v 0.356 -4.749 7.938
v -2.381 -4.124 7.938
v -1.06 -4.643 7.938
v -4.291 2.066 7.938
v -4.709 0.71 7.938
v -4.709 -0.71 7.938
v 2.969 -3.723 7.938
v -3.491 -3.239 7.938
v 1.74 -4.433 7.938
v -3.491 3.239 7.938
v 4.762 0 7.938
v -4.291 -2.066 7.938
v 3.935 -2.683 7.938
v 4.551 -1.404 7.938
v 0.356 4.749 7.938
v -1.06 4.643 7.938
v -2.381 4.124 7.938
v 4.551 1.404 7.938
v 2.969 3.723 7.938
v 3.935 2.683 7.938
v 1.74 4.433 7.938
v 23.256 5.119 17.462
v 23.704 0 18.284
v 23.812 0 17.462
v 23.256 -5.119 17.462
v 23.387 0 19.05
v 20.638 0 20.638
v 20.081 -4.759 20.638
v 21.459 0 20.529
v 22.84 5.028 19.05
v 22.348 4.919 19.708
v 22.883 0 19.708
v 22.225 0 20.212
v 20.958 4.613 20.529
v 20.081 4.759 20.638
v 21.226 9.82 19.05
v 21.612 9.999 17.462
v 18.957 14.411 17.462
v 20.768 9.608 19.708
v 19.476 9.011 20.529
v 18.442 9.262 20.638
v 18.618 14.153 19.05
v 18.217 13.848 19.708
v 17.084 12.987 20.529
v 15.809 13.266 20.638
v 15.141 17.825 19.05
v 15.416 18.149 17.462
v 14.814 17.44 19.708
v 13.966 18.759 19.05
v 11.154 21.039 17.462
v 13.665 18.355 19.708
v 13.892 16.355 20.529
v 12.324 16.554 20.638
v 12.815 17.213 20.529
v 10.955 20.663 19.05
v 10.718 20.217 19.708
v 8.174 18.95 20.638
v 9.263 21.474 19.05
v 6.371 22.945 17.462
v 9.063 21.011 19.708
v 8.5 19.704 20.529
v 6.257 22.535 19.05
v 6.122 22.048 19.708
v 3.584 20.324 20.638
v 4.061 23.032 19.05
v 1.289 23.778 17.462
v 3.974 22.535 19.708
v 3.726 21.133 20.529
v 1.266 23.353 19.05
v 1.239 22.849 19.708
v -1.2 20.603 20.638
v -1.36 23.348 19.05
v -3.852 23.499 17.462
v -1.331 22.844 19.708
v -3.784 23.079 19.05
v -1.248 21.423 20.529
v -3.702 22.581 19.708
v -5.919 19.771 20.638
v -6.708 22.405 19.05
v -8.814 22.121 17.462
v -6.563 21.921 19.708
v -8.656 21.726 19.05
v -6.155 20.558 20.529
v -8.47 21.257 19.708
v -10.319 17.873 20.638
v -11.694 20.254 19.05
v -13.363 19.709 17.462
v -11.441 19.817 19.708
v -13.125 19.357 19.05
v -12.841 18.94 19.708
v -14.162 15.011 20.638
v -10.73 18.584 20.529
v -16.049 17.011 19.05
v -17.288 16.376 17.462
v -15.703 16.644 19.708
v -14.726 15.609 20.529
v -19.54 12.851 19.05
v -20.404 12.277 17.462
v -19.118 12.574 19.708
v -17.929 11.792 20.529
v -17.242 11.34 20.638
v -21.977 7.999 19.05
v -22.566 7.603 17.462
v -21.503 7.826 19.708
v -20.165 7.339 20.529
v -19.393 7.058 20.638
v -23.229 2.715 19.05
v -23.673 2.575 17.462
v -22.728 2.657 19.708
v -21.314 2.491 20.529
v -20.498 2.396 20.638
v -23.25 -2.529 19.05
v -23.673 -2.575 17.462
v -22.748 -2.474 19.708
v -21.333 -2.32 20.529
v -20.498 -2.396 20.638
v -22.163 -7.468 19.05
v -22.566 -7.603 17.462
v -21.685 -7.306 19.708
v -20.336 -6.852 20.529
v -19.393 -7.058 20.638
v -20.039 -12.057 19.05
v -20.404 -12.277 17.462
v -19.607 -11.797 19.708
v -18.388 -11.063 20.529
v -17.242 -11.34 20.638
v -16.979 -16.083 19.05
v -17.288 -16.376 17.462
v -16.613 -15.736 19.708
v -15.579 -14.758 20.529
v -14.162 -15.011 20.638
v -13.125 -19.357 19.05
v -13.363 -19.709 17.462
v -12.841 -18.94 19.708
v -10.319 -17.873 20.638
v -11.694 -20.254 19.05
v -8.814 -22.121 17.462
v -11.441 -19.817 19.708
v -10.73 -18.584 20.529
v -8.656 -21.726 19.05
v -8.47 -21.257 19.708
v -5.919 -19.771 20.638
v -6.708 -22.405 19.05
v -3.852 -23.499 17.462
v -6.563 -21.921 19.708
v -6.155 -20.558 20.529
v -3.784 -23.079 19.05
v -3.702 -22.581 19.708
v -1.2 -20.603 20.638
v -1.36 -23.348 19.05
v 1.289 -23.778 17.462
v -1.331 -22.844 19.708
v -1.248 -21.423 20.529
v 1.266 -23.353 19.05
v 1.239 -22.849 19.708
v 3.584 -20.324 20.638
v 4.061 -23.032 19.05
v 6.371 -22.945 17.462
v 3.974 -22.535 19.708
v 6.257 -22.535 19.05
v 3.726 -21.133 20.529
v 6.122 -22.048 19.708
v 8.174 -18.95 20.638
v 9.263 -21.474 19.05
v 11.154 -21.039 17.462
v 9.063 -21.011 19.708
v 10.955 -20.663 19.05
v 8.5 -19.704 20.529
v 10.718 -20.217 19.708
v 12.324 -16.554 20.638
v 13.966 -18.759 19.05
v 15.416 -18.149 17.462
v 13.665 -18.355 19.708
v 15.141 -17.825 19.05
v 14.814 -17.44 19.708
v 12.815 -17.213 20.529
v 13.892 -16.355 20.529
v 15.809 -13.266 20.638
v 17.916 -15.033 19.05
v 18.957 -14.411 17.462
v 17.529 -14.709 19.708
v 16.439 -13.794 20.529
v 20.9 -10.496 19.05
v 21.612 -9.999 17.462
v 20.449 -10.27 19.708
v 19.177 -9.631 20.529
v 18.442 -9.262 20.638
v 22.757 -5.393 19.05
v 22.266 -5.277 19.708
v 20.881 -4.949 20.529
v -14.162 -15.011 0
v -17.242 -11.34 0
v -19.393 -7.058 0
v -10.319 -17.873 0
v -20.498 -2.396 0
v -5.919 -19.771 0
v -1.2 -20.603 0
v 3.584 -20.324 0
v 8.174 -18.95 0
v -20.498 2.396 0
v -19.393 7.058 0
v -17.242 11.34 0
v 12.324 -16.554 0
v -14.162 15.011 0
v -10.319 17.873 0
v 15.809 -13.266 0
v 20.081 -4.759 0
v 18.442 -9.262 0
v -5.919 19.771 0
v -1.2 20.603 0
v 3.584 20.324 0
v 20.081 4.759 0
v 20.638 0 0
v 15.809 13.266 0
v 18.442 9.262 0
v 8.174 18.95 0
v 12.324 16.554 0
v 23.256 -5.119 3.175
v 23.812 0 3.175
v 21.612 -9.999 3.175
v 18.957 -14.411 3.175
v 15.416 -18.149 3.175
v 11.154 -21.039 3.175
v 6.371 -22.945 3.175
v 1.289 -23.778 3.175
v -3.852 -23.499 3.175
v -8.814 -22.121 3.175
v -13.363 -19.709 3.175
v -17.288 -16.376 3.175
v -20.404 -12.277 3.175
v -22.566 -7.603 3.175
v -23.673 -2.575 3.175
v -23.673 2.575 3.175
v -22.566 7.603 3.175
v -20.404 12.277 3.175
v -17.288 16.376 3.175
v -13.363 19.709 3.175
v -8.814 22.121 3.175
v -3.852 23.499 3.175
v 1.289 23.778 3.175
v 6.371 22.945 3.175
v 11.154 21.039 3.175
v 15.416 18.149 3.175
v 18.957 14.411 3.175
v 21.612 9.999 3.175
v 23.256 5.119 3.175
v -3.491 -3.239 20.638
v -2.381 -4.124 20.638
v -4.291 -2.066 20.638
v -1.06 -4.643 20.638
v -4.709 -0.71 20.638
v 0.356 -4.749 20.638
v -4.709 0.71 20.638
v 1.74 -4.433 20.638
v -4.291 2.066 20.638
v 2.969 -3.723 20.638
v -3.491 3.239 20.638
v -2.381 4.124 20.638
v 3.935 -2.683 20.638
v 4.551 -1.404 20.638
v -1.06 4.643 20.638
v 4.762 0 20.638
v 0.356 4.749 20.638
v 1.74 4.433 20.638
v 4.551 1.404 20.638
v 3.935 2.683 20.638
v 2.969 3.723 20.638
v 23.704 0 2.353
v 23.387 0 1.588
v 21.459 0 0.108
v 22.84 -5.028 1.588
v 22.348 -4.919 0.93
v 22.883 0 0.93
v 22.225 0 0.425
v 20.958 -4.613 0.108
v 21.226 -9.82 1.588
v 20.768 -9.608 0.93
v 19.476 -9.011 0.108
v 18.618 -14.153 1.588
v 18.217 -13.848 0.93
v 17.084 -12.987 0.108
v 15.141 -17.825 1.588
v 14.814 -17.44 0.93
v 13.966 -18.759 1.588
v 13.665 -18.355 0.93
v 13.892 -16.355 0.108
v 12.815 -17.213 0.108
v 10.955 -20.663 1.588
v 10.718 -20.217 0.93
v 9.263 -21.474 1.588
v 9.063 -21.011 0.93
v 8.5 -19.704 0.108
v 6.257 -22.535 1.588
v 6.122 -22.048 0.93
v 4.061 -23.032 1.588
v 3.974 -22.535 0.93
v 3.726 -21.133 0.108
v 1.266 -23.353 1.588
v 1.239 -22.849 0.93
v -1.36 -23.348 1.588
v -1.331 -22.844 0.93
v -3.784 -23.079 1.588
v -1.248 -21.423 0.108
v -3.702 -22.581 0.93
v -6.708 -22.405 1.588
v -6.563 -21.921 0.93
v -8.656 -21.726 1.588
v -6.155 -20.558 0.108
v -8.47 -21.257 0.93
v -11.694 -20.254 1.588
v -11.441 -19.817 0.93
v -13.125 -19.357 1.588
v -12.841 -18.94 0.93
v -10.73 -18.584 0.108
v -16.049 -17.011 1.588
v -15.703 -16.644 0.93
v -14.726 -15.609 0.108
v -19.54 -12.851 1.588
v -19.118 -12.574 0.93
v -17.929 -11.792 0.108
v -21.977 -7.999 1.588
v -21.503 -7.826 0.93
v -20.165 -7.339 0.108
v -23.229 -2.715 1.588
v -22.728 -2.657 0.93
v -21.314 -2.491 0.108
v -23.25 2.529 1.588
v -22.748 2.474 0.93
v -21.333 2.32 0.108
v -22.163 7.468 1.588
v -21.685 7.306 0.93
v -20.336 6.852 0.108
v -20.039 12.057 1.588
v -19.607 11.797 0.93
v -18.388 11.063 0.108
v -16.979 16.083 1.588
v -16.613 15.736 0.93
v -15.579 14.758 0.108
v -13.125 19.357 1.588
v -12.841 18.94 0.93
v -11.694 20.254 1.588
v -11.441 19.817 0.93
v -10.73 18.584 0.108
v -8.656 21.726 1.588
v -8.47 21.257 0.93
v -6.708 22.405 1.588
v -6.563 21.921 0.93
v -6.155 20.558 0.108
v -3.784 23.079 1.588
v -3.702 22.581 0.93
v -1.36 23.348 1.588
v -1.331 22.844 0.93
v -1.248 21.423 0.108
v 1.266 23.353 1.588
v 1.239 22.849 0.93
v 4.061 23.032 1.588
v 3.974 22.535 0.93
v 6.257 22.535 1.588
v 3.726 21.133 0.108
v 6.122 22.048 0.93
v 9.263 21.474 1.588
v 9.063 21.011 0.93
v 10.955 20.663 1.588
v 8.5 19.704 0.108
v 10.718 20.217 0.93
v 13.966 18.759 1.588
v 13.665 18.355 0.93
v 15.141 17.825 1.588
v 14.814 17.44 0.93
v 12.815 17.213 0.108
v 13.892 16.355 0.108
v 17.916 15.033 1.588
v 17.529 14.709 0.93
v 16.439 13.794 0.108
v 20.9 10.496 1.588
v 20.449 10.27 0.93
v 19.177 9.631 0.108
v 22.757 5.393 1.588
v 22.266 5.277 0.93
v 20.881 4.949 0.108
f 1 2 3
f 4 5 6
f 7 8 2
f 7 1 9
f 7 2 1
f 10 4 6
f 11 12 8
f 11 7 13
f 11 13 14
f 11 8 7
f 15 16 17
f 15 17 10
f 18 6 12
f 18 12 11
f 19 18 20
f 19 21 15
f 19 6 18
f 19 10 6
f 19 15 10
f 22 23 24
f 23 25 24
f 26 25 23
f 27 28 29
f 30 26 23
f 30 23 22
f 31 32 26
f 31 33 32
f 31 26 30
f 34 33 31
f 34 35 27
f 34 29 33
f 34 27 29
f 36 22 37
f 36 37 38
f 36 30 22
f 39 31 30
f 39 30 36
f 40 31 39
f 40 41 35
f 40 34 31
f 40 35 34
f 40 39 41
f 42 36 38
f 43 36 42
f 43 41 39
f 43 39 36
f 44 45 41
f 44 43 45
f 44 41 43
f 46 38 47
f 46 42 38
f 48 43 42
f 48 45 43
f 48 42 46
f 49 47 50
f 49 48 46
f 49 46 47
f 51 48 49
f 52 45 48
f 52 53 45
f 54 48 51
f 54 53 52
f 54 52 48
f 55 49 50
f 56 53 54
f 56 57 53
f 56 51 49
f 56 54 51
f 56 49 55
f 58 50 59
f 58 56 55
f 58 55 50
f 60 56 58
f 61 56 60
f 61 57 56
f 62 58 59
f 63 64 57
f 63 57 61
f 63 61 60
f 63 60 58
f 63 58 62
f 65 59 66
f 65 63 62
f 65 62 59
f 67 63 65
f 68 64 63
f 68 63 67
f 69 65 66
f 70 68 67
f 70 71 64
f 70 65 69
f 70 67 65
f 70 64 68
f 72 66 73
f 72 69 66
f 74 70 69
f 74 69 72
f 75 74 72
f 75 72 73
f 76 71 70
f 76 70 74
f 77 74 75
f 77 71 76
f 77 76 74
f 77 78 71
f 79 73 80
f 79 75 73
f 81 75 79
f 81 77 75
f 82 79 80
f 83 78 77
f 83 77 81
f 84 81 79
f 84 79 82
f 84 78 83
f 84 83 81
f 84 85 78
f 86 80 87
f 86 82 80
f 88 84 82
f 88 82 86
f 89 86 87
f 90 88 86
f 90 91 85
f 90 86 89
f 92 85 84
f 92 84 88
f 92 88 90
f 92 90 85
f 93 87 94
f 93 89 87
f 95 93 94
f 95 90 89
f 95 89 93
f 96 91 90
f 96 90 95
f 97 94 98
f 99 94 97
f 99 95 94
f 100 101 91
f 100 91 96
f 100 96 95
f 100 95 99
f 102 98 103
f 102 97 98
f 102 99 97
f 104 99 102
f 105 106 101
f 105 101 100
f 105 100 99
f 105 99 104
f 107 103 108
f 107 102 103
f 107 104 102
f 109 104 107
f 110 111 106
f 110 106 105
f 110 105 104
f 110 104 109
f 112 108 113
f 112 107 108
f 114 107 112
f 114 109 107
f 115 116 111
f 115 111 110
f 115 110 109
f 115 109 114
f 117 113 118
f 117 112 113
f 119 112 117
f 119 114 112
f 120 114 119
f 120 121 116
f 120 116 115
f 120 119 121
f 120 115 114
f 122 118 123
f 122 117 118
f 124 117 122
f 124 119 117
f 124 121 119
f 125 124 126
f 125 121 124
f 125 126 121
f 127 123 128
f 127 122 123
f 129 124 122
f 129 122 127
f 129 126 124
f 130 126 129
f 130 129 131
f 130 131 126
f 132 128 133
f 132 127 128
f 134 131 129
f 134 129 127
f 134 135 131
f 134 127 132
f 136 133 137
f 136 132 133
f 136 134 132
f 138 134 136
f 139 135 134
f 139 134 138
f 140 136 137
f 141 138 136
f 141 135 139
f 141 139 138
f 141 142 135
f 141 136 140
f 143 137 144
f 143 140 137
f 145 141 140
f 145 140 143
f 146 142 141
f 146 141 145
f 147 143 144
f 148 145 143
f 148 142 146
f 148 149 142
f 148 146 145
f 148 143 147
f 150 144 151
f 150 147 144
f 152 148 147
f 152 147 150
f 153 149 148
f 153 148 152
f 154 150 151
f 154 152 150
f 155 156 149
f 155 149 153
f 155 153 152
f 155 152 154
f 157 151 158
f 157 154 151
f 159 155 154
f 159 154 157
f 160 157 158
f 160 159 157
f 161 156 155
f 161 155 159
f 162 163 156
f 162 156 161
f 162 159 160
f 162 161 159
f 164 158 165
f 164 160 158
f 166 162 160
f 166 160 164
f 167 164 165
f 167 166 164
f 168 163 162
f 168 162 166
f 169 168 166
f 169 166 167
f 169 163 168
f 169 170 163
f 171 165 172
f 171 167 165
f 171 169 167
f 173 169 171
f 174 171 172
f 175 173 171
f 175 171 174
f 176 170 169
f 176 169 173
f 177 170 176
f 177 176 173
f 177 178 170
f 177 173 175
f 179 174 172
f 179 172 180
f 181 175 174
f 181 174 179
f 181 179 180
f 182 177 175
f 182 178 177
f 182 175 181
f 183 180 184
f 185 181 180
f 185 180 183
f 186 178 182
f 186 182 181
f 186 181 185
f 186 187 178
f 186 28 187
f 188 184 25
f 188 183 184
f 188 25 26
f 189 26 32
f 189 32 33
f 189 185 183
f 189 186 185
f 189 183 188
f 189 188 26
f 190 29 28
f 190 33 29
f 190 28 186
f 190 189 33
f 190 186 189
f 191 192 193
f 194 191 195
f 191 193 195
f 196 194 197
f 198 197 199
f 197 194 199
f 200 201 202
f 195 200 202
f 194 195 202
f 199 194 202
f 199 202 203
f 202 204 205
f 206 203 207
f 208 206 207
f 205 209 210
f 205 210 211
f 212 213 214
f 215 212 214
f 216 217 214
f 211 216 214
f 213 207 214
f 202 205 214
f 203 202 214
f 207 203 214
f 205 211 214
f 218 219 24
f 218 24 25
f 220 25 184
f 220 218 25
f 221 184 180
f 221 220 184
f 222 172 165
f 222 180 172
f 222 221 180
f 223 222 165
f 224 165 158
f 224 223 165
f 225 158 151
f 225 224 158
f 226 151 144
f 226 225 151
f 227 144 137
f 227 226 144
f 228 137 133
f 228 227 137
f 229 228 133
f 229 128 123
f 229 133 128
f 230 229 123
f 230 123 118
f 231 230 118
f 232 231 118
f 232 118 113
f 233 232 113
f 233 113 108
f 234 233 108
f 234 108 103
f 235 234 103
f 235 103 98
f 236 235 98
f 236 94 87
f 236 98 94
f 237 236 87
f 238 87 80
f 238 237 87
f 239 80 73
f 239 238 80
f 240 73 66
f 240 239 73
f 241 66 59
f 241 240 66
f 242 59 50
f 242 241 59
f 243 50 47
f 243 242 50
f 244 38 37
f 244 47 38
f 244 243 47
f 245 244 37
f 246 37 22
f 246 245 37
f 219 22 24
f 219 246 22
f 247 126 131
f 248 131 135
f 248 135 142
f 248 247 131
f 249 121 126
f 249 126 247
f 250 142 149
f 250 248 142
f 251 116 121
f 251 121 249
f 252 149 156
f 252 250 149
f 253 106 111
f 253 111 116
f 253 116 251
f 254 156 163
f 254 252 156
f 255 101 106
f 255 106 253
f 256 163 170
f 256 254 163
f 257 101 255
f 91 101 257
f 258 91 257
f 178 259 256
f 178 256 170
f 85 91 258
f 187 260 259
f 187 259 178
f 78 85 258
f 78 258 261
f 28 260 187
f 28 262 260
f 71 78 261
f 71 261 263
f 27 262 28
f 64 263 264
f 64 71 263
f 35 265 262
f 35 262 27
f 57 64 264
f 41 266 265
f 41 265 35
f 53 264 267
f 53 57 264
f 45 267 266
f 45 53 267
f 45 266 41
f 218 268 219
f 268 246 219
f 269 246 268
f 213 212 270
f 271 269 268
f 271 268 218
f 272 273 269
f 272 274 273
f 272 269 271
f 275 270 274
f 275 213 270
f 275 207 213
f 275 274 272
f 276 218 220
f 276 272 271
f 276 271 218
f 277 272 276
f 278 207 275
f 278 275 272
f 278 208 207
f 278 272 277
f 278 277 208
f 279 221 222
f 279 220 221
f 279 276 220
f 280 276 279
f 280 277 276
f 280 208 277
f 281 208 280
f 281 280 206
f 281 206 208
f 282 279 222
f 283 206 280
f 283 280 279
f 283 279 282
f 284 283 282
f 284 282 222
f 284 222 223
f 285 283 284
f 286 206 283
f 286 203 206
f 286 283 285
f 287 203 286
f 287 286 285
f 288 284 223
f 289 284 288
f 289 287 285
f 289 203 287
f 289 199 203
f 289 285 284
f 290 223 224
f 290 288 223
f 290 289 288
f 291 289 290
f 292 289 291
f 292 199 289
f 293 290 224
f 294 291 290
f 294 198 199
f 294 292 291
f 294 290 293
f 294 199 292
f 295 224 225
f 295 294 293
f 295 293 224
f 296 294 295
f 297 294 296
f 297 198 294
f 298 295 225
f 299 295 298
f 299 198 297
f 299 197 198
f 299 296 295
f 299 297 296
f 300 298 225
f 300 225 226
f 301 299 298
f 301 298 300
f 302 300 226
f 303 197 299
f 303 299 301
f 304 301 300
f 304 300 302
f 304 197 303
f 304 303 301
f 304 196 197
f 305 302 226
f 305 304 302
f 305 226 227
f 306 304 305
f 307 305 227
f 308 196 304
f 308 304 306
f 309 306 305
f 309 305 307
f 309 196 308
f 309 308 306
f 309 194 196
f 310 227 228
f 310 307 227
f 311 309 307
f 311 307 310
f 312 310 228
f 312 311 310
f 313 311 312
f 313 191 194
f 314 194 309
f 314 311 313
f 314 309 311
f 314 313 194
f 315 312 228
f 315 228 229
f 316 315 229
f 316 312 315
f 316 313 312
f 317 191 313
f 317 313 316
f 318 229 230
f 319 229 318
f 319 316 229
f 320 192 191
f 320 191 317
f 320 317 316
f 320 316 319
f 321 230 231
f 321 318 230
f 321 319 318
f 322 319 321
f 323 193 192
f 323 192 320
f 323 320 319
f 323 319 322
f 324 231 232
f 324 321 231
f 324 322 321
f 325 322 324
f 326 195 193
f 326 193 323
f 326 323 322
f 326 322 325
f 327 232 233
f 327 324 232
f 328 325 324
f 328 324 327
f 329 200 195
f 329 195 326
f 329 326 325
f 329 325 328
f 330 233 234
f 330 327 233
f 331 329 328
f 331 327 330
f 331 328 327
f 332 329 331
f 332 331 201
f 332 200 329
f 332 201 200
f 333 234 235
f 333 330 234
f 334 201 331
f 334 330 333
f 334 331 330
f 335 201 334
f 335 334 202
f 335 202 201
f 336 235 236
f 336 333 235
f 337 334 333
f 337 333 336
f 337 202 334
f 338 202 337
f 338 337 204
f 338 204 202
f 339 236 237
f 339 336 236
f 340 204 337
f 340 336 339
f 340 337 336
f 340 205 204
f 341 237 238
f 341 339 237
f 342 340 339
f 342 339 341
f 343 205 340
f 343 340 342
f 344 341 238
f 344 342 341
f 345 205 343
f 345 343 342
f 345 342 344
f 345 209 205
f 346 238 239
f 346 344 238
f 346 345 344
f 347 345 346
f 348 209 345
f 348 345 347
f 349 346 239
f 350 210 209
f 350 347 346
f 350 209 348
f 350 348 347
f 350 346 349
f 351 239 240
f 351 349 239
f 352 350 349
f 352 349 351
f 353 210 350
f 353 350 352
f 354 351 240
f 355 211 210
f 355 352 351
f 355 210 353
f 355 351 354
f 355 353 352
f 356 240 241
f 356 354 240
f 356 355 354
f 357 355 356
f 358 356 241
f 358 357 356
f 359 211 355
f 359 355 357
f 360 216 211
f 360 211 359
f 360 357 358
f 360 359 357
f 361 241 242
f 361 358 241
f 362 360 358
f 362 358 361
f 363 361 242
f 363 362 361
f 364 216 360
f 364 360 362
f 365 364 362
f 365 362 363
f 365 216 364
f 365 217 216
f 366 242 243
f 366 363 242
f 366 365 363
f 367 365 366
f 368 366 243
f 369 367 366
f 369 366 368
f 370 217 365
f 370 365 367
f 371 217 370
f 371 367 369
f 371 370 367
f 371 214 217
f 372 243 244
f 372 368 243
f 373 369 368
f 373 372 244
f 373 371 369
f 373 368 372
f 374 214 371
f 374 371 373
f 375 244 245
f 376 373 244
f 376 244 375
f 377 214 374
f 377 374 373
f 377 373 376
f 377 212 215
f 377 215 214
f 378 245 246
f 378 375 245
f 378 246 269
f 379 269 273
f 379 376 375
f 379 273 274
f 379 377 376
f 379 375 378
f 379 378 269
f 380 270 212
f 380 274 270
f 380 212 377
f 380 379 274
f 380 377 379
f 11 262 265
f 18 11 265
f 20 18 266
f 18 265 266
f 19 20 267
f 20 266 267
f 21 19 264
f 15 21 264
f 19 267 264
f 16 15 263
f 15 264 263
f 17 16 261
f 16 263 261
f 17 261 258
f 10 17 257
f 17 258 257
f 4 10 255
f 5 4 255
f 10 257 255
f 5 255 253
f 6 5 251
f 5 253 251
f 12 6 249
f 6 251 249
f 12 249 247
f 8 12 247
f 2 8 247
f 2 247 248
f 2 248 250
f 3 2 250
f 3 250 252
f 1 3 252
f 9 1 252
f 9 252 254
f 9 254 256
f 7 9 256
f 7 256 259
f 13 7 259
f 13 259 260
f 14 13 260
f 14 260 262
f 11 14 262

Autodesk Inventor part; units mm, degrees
ref_plane "YZ Plane" through (0, 0, 0) normal (1, 0, 0) x (0, 1, 0)
ref_plane "XZ Plane" through (0, 0, 0) normal (0, 1, 0) x (-1, 0, 0)
ref_plane "XY Plane" through (0, 0, 0) normal (0, 0, 1) x (1, 0, 0)
sketch "Sketch1" plane through (0, 0, 0) normal (0, 0, 1) x (1, 0, 0)
  circle A0 centre (0, 0) radius 23.8125
  dimension "d0" = 47.625
extrude "Extrusion1" add sketch "Sketch1" along normal blind 20.6375
sketch "Sketch2" plane through (0, 0, 20.6375) normal (0, 0, 1) x (1, 0, 0)
  circle A0 centre (0, 0) radius 23.8125 projected
  circle A1 centre (0, 0) radius 4.7625
  dimension "d3" = 9.525
extrude "Extrusion2" cut sketch "Sketch2" against normal blind 12.7 contours A1
fillet "Fillet1" radius 3.175 2 edges at (-23.8125, 0, 20.6375) (-23.8125, 0, 0)
properties part number "rough pulley"
